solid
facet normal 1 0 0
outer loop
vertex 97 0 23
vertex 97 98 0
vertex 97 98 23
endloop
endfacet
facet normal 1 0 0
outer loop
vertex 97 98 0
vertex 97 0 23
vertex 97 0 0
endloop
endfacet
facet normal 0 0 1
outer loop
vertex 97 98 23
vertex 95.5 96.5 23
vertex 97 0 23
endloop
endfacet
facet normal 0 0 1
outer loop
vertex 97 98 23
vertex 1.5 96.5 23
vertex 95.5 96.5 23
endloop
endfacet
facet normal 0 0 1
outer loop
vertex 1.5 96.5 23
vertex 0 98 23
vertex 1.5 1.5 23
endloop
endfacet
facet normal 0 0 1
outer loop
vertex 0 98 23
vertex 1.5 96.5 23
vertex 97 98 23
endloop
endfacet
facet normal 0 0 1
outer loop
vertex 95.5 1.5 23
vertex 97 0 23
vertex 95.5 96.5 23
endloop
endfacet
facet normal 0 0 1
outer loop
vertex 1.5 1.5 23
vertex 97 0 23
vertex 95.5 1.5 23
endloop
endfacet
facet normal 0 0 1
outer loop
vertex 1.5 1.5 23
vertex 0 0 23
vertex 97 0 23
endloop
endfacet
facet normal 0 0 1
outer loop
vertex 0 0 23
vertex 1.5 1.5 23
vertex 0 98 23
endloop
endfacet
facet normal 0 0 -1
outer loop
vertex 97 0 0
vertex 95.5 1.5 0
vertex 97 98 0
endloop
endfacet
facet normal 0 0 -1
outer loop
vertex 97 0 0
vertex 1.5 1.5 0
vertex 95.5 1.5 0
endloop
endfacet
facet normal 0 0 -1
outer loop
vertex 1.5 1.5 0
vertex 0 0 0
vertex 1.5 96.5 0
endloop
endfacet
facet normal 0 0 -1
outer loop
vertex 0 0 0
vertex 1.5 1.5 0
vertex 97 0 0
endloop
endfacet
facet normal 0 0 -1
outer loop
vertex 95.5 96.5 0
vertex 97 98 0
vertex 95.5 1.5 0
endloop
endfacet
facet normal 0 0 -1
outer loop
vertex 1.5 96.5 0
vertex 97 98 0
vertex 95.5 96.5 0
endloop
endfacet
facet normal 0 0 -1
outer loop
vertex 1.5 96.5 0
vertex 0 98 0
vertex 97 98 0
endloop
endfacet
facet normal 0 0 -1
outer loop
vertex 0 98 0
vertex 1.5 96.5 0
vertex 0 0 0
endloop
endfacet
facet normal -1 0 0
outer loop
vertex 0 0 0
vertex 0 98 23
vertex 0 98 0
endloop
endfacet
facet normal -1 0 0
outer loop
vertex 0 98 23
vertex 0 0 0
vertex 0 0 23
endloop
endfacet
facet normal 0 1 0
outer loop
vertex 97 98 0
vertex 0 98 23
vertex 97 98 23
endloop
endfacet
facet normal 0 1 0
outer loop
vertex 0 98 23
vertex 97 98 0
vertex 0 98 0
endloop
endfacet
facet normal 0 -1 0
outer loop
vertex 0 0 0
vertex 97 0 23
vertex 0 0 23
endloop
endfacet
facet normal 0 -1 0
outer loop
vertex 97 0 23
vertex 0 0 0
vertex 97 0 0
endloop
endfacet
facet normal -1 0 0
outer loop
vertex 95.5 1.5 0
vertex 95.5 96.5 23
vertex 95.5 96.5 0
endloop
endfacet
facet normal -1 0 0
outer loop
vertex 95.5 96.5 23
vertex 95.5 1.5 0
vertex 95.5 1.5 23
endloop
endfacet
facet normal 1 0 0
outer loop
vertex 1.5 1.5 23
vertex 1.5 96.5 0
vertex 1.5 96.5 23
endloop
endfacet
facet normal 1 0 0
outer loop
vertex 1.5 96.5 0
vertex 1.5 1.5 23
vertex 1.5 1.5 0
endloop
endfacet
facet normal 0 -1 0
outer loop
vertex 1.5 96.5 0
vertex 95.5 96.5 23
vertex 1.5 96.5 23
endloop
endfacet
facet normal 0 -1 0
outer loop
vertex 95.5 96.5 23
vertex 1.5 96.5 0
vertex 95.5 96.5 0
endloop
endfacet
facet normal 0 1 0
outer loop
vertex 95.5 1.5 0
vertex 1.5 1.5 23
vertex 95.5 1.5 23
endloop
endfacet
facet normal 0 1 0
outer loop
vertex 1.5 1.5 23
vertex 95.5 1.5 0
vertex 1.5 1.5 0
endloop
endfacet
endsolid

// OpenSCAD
include <boardgame_insert_toolkit_lib.2.scad>;

// determines whether lids are output.
g_b_print_lid = true;

// determines whether boxes are output.
g_b_print_box = false; 

// Focus on one box
g_isolated_print_box = ""; 

// Used to visualize how all of the boxes fit together. 
g_b_visualization = false;          
        
// this is the outer wall thickness. 
//Default = 1.5mm
g_wall_thickness = 1.5;

// The tolerance value is extra space put between planes of the lid and box that fit together.
// Increase the tolerance to loosen the fit and decrease it to tighten it.
//
// Note that the tolerance is applied exclusively to the lid.
// So if the lid is too tight or too loose, change this value ( up for looser fit, down for tighter fit ) and 
// you only need to reprint the lid.
// 
// The exception is the stackable box, where the bottom of the box is the lid of the box below,
// in which case the tolerance also affects that box bottom.
//
g_tolerance = 0.15;

// This adjusts the position of the lid detents downward. 
// The larger the value, the bigger the gap between the lid and the box.
g_tolerance_detents_pos = 0.1;

data =
[  

    [   "bottom spacer",
        [
            [ BOX_SIZE_XYZ,[97, 98, 23] ],
            [ TYPE, SPACER]
                          
        ]
    ],
];


MakeAll();
